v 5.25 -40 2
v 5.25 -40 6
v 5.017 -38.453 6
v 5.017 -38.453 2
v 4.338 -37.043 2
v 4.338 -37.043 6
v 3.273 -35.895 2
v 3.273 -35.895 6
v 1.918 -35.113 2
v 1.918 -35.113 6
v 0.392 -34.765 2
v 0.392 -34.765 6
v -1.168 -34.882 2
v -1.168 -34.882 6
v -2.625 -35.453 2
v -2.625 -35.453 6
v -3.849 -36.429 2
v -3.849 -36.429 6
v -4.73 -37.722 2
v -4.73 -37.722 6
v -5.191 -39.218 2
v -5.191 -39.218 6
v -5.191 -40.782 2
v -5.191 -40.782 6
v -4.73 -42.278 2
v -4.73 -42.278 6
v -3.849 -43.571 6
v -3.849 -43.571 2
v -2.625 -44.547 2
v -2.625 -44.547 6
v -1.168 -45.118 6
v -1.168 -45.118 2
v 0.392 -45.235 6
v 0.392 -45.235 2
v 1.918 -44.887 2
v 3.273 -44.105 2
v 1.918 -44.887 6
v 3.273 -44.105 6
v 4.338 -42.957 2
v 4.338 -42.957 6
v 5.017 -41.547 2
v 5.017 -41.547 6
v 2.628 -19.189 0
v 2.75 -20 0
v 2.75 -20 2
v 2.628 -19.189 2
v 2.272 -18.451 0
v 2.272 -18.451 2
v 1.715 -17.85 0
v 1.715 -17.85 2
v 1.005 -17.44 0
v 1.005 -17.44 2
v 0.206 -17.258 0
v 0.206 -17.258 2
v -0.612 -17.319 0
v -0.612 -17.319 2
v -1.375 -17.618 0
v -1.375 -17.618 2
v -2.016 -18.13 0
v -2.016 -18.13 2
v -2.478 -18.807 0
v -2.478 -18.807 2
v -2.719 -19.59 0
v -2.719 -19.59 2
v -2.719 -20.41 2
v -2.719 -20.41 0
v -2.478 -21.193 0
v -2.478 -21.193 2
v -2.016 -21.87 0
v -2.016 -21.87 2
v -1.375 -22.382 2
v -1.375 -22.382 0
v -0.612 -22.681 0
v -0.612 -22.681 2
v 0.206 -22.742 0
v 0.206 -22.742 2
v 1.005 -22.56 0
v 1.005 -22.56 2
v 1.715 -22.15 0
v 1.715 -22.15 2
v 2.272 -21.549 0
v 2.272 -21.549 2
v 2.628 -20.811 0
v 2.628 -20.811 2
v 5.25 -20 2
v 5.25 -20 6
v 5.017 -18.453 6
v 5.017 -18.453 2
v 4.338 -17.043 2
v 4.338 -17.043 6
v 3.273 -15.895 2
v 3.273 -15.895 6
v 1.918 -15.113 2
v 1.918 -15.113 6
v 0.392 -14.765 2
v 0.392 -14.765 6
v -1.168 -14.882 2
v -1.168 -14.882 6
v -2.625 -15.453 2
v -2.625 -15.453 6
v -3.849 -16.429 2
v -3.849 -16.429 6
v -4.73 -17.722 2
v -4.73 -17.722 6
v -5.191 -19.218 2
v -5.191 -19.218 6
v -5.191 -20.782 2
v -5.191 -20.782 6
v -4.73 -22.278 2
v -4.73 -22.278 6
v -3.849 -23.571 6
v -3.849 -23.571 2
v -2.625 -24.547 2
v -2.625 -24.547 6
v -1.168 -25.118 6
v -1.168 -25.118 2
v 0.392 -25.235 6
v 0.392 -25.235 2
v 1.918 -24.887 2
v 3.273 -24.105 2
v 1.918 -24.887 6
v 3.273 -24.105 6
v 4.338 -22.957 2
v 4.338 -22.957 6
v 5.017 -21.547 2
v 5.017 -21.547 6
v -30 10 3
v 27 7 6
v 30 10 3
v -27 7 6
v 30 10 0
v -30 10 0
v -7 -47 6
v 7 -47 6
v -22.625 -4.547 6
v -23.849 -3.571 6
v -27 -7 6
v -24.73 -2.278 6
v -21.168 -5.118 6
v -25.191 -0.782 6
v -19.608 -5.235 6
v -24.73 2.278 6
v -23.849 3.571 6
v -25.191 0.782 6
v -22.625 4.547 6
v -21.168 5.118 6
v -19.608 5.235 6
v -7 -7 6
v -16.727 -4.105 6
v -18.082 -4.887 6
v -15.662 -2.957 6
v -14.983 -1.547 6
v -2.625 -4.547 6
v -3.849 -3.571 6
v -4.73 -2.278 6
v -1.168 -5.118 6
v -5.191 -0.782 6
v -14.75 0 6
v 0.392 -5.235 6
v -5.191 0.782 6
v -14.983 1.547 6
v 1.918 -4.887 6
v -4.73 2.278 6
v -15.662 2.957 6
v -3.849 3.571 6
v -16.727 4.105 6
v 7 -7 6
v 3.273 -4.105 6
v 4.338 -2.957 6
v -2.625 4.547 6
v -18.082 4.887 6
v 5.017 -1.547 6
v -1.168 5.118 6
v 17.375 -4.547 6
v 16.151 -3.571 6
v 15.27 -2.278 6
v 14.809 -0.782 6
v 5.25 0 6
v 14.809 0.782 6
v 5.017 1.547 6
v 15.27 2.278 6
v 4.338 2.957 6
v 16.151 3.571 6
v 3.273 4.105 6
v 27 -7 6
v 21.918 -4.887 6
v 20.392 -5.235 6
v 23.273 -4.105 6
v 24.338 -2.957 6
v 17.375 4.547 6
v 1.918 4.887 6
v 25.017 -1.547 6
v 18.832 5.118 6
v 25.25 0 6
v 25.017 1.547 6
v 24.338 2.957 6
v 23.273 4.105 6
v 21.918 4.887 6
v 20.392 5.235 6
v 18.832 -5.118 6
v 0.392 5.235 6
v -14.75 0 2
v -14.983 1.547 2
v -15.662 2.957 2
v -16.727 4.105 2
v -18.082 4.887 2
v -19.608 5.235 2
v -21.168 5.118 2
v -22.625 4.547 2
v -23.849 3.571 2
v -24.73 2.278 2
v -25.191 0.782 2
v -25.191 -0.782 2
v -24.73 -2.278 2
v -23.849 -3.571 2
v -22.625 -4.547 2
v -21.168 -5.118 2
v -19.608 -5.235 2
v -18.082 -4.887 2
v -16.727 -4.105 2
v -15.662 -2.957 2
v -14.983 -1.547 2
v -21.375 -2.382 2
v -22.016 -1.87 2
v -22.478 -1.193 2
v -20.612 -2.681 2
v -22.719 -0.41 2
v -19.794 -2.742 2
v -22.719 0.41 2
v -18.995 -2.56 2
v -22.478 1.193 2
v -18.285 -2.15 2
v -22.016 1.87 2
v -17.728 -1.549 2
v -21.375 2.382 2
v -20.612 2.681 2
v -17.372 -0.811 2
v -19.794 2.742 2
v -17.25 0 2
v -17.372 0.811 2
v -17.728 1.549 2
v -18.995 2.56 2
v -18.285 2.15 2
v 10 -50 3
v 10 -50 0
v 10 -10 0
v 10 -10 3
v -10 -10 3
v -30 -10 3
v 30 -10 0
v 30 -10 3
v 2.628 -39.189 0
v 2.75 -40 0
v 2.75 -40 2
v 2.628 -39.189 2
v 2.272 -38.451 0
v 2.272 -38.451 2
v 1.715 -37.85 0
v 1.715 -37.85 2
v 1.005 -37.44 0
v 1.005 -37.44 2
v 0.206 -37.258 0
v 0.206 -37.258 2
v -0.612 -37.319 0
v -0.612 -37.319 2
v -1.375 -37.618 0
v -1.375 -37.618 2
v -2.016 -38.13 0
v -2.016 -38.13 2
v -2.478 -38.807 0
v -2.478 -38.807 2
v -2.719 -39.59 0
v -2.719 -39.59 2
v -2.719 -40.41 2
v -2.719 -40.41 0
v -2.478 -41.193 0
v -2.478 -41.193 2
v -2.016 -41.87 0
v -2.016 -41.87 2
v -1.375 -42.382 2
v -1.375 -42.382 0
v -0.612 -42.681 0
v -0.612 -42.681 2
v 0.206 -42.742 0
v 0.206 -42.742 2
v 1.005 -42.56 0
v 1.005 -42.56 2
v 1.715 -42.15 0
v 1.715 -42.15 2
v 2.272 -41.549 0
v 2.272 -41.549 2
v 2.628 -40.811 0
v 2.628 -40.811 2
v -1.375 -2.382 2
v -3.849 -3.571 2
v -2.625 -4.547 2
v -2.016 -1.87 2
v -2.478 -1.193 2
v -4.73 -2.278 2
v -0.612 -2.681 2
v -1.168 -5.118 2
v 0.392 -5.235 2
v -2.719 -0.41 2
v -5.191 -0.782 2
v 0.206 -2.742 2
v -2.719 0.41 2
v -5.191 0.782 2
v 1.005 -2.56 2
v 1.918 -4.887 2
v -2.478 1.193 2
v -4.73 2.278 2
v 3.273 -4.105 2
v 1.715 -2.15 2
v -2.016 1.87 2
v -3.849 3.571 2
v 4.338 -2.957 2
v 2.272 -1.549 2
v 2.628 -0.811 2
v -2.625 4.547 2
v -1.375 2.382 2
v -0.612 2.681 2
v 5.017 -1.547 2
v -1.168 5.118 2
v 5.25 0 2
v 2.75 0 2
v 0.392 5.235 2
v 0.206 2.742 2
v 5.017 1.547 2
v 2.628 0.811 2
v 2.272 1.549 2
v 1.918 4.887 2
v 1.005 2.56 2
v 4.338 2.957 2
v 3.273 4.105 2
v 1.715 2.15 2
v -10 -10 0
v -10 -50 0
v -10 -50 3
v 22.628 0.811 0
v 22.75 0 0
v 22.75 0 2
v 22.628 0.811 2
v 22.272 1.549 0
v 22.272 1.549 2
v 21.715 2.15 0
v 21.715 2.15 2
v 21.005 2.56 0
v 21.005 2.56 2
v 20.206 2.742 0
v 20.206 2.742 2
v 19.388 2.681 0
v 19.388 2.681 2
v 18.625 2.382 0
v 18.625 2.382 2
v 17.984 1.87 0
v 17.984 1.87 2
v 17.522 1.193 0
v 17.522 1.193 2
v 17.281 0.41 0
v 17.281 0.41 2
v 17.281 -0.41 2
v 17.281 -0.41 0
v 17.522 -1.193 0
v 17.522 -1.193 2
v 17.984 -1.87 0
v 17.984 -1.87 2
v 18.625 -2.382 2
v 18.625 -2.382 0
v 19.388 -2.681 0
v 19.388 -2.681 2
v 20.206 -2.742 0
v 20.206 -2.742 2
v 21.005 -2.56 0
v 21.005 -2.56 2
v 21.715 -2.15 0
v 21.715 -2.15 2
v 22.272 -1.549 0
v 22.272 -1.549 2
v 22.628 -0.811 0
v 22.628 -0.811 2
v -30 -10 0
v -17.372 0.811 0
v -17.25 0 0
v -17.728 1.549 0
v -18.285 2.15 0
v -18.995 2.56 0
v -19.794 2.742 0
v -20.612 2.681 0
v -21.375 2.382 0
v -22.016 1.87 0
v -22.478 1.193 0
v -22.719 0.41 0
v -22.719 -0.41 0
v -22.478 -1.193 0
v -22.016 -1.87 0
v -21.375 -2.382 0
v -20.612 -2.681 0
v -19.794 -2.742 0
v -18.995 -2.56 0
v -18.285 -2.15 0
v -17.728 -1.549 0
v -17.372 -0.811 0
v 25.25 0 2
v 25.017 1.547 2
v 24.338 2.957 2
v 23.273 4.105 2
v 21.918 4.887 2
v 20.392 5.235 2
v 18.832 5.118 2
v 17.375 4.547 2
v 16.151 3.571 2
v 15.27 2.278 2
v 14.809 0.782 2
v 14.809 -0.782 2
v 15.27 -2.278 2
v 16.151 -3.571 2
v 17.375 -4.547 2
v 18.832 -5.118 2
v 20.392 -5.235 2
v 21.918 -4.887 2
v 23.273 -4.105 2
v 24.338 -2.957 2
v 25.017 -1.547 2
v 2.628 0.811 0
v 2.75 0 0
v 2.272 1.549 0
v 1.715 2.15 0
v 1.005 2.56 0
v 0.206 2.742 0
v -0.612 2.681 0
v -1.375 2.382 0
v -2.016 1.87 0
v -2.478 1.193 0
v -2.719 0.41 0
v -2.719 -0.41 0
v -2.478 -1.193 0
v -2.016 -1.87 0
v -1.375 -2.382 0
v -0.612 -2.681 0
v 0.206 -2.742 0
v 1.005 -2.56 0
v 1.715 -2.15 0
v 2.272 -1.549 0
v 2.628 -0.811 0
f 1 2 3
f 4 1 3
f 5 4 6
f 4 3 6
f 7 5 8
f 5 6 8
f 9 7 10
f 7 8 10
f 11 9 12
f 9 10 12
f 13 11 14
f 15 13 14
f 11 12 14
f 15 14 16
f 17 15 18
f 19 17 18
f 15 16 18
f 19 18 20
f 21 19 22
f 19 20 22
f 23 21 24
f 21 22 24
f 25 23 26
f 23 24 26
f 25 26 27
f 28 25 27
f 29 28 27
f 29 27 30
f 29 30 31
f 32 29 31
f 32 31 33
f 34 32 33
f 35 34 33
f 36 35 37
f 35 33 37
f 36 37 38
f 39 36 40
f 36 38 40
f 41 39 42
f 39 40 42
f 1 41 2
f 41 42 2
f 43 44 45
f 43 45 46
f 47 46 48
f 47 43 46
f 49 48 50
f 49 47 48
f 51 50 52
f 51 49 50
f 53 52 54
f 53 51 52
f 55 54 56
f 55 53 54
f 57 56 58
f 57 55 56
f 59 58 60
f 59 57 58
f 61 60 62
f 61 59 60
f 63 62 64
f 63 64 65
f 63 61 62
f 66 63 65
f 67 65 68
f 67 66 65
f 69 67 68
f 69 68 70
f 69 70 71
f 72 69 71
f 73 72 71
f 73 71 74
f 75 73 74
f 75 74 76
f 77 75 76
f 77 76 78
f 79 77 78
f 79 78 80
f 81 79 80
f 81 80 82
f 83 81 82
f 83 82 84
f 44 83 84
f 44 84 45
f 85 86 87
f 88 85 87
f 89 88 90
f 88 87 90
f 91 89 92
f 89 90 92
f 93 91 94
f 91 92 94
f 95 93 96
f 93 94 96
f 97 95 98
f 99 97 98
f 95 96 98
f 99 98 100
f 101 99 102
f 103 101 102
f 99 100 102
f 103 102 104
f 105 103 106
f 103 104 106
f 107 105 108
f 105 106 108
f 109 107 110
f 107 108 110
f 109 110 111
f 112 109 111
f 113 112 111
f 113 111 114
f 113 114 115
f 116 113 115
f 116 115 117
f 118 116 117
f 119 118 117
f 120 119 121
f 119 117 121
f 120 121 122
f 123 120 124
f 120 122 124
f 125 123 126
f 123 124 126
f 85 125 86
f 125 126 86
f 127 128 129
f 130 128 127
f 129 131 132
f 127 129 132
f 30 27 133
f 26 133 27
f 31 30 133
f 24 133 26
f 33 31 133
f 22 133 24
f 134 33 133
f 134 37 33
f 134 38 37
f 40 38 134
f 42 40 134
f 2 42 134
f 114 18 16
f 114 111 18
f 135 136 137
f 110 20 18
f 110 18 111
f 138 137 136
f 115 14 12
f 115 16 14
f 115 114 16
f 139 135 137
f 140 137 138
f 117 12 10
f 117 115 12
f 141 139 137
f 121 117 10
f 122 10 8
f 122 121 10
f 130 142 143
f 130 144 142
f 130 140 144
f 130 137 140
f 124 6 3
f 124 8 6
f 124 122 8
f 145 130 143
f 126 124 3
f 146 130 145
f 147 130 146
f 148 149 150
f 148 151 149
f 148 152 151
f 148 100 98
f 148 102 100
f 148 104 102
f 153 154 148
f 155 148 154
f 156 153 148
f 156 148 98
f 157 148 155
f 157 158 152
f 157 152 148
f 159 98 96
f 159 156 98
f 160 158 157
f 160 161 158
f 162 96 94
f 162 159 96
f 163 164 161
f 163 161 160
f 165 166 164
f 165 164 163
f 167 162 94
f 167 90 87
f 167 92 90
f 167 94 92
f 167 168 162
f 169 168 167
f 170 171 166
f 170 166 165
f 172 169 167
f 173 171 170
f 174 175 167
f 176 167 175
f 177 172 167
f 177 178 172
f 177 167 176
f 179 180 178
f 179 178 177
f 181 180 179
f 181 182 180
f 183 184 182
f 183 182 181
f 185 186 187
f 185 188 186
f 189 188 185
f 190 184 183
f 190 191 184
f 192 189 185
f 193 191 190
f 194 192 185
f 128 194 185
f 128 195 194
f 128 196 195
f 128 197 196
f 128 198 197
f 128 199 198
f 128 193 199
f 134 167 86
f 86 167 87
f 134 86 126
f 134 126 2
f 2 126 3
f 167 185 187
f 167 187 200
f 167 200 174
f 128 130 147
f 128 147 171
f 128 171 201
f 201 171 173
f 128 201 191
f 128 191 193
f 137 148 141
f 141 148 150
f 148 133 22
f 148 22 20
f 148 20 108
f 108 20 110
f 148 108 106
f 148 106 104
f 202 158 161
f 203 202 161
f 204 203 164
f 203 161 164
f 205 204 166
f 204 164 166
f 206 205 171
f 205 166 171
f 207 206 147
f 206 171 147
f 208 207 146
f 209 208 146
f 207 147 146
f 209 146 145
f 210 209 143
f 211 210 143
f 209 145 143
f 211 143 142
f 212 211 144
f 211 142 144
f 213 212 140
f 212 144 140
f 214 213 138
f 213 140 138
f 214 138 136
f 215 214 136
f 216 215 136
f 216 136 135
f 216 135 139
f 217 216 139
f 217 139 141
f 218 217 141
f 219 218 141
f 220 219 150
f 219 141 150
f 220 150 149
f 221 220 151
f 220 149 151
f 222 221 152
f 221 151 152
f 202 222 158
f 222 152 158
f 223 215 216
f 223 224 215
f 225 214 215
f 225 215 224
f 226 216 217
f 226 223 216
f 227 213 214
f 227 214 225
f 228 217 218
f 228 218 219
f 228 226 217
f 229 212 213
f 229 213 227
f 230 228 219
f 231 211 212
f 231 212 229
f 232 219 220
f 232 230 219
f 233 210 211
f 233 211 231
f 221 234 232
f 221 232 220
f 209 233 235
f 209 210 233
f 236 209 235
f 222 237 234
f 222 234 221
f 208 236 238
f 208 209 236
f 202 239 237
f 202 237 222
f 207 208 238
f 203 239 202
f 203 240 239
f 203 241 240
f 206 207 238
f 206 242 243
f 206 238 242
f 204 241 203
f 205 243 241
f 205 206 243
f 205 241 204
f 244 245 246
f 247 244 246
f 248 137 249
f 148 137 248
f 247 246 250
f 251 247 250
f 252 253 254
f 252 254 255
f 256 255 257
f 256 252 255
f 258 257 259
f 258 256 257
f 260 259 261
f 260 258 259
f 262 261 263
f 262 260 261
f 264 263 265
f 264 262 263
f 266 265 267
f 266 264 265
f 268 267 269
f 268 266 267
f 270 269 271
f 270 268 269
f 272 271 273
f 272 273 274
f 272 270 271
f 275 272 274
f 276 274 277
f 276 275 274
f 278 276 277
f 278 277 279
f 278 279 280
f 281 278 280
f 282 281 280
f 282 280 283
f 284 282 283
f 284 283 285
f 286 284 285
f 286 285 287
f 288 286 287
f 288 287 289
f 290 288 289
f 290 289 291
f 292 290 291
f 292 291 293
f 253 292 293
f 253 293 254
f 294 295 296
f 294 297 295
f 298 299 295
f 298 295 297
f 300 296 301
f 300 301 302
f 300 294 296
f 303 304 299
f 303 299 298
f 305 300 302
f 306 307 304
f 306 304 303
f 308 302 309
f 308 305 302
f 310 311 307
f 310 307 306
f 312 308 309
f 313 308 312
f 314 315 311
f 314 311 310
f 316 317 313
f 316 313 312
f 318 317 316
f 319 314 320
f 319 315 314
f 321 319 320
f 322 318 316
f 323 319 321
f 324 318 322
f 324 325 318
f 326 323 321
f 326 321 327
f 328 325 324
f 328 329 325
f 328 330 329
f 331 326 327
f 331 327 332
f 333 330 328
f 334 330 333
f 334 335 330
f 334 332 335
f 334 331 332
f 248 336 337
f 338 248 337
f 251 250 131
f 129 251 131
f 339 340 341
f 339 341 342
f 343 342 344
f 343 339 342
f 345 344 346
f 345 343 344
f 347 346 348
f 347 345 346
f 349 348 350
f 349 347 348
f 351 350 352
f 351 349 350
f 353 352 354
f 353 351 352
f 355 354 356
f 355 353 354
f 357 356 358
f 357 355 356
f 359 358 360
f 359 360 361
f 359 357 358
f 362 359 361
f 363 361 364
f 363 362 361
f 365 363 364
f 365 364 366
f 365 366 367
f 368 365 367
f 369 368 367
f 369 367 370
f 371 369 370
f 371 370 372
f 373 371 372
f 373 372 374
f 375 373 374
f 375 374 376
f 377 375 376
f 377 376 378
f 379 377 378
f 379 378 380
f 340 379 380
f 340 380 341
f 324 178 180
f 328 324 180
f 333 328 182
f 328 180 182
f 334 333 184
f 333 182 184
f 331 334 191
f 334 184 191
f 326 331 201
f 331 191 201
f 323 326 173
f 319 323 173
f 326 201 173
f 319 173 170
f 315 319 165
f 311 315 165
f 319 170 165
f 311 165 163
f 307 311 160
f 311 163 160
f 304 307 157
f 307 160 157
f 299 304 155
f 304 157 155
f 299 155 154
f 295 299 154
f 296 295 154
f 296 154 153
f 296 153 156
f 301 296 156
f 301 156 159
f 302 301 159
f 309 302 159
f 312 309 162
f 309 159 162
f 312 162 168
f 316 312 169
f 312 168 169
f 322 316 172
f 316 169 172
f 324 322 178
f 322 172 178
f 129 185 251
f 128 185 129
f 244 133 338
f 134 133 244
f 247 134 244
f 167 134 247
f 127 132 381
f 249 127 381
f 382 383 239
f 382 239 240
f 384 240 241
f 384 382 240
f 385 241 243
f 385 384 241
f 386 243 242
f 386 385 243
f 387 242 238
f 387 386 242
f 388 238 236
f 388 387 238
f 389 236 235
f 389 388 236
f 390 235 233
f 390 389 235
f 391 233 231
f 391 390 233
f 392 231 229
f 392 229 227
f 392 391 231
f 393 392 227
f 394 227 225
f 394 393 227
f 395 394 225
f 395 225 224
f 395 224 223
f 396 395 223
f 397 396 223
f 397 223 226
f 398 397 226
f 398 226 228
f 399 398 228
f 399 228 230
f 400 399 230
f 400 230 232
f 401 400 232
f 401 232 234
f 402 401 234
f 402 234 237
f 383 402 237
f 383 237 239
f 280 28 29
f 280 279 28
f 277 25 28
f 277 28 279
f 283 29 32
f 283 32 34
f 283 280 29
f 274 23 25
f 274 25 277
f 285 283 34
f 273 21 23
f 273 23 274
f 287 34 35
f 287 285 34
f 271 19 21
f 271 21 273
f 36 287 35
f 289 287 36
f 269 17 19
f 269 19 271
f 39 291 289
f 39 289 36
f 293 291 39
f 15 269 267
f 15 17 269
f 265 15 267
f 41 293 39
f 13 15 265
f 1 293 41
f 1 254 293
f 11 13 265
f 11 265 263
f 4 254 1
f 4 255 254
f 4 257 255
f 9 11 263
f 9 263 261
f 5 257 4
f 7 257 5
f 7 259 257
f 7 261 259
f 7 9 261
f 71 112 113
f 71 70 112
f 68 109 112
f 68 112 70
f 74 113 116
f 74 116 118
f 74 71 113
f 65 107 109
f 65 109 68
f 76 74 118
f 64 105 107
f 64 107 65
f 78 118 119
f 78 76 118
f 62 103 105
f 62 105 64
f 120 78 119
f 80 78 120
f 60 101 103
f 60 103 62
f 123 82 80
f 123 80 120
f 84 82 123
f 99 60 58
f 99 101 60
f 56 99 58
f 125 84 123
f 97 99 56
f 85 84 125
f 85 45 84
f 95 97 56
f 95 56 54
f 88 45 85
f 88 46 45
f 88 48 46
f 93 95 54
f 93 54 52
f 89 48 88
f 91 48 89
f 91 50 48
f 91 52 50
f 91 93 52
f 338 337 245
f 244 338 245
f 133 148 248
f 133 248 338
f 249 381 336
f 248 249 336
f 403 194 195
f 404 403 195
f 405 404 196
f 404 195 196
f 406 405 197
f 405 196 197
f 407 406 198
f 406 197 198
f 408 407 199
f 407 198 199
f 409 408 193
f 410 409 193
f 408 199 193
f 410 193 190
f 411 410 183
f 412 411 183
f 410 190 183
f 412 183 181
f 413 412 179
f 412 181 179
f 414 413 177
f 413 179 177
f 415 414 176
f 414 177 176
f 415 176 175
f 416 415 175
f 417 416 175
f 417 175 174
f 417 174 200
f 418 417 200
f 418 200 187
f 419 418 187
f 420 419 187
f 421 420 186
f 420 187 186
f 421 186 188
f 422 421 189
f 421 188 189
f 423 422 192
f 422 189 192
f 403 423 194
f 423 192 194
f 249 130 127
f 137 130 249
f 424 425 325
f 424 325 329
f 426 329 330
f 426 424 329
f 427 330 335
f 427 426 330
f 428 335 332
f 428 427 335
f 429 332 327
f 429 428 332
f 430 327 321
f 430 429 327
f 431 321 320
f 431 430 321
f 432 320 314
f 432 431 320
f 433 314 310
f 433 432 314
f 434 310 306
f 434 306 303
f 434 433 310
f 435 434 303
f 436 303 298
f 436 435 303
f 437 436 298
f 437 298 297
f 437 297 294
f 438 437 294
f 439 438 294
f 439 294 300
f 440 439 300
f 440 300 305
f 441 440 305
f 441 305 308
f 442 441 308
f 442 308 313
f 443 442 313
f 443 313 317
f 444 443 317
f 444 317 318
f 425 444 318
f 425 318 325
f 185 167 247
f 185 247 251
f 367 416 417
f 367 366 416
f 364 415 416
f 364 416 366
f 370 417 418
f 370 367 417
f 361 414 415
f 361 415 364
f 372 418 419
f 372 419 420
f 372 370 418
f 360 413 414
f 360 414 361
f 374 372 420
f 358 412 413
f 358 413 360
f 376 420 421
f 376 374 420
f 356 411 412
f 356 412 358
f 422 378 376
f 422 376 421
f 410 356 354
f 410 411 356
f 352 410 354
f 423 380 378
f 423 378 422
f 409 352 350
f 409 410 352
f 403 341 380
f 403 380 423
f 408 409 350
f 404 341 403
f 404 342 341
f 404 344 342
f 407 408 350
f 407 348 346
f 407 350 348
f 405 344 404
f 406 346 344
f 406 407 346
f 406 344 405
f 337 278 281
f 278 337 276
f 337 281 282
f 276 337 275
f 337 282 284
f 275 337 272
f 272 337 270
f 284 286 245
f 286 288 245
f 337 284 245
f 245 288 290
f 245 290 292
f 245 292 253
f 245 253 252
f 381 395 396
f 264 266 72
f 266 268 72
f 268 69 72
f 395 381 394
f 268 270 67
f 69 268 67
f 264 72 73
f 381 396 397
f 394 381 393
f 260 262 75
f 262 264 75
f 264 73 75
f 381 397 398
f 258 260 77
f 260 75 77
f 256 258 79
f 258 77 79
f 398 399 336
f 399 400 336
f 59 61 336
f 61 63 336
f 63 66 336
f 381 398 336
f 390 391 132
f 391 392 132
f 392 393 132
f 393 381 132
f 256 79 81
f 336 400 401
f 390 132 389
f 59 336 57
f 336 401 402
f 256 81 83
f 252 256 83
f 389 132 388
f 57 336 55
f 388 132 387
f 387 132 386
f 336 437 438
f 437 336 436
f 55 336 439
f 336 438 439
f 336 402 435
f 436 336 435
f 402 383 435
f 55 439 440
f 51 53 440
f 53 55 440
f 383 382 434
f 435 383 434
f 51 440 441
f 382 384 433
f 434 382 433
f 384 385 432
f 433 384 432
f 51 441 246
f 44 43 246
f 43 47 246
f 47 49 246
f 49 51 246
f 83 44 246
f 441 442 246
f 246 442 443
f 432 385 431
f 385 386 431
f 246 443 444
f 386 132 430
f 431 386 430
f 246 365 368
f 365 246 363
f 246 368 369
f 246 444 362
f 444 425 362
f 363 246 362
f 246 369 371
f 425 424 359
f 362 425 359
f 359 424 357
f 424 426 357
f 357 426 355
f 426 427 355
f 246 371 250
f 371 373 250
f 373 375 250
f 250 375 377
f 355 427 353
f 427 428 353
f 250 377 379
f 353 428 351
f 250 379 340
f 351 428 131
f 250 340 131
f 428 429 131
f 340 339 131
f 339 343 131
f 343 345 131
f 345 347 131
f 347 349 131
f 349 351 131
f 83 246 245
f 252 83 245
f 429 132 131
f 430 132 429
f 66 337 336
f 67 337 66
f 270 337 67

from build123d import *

# Parameters (mm, degrees)
F2_R     = 2.75
F3_DEPTH = 6
F4_SIZE  = 3
F5_R     = 5.25
F5_R_2   = 2.75
F6_DEPTH = 4


with BuildPart() as f3:
    # F2 (on Top) → F3 (new body)
    with BuildSketch(Plane.XY):
        Polygon((-10, -50), (0, -50), (10, -50), (10, -10), (30, -10), (30, 10), (0, 10), (-30, 10), (-30, -10), (-10, -10), align=None)
        with Locations((0, -40)):
            Circle(F2_R, mode=Mode.SUBTRACT)
        with Locations((-20, 0)):
            Circle(F2_R, mode=Mode.SUBTRACT)
        with Locations((0, -20)):
            Circle(F2_R, mode=Mode.SUBTRACT)
        Circle(F2_R, mode=Mode.SUBTRACT)
        with Locations((20, 0)):
            Circle(F2_R, mode=Mode.SUBTRACT)
    extrude(amount=F3_DEPTH)

    # F4
    f4_edges = [f3.edges().sort_by_distance(p)[0] for p in [
        (0, -50, 6),
        (10, -30, 6),
        (20, -10, 6),
        (30, 0, 6),
        (0, 10, 6),
        (-30, 0, 6),
        (-20, -10, 6),
        (-10, -30, 6),
    ]]
    chamfer(f4_edges, length=F4_SIZE)

    # F5 (on face) → F6 (cut)
    with BuildSketch(Plane.XY.offset(6)):
        with Locations((-20, 0)):
            Circle(F5_R)
        with Locations((-20, 0)):
            Circle(F5_R_2, mode=Mode.SUBTRACT)
        Circle(F5_R)
        Circle(F5_R_2, mode=Mode.SUBTRACT)
        with Locations((20, 0)):
            Circle(F5_R)
        with Locations((20, 0)):
            Circle(F5_R_2, mode=Mode.SUBTRACT)
        with Locations((0, -20)):
            Circle(F5_R)
        with Locations((0, -20)):
            Circle(F5_R_2, mode=Mode.SUBTRACT)
        with Locations((0, -40)):
            Circle(F5_R)
        with Locations((0, -40)):
            Circle(F5_R_2, mode=Mode.SUBTRACT)
    extrude(amount=-F6_DEPTH, mode=Mode.SUBTRACT)


solid = f3.part
